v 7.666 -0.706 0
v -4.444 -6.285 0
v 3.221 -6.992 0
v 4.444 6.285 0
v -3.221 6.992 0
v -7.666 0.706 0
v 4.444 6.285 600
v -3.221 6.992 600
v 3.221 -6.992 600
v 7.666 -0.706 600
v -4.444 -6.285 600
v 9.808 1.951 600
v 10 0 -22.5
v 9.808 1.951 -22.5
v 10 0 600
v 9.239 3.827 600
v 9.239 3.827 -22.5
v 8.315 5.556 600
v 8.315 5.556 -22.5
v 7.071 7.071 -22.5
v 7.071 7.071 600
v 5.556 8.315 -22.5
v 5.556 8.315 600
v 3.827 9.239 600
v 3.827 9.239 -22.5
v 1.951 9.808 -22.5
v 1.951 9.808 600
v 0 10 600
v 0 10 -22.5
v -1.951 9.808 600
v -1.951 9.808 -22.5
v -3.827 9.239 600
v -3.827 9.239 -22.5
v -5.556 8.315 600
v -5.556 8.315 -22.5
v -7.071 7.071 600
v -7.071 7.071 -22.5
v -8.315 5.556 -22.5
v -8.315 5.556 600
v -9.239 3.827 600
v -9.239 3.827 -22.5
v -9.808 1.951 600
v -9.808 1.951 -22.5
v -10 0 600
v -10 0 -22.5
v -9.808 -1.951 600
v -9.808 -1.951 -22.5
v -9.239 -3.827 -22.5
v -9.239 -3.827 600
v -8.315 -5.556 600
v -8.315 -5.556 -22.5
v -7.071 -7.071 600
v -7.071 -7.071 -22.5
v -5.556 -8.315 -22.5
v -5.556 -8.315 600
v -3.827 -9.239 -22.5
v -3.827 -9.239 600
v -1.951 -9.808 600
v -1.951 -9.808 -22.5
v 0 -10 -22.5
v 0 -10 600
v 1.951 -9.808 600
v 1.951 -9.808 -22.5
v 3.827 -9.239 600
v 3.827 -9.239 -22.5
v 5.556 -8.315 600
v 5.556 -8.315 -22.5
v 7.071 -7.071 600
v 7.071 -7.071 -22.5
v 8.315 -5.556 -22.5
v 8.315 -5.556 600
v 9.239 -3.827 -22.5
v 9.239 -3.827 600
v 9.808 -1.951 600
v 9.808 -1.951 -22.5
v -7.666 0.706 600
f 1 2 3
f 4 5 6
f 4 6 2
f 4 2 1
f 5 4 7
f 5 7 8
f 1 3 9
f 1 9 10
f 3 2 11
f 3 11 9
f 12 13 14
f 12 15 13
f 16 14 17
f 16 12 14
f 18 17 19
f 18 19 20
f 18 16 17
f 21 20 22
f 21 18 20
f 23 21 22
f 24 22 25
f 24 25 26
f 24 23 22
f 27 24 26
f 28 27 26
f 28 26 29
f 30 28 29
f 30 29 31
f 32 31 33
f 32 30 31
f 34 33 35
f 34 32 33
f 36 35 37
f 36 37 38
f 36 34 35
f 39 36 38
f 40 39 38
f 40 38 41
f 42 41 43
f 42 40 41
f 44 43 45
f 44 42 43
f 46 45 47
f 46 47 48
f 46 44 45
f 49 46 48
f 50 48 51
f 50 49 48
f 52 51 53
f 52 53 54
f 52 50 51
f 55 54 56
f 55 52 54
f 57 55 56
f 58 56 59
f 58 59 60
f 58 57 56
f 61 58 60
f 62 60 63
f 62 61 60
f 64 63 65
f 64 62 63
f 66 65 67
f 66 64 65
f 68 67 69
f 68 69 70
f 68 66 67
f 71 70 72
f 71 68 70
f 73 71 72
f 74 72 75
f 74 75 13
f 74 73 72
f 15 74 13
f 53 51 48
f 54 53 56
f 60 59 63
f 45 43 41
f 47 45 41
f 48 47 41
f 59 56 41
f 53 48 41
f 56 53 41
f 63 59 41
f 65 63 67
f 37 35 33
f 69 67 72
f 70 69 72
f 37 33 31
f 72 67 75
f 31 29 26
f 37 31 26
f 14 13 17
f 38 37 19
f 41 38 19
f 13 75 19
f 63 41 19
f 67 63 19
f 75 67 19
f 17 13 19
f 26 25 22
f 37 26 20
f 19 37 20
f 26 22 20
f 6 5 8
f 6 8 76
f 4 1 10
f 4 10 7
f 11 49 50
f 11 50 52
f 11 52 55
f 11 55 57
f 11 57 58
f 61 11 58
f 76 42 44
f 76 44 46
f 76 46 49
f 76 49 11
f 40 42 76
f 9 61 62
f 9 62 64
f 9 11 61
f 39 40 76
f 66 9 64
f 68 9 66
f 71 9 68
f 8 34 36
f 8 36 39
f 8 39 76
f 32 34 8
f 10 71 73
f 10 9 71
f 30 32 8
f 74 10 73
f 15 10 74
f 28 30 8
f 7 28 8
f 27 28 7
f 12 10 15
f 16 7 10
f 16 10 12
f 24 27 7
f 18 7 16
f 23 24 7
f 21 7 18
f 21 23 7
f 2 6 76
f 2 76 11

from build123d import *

# Parameters (mm, degrees)
SKETCH1_R           = 10
BOSS_EXTRUDE1_DEPTH = 600
SKETCH2_R           = 10
BOSS_EXTRUDE2_DEPTH = 22.5


with BuildPart() as part:
    # Sketch1 → Boss-Extrude1 (new body)
    with BuildSketch(Plane.XY):
        Circle(SKETCH1_R)
        Polygon((7.665529004, -0.706345771), (4.444477884, 6.285369965), (-3.22105112, 6.991715737), (-7.665529004, 0.706345771), (-4.444477884, -6.285369965), (3.22105112, -6.991715737), align=None, mode=Mode.SUBTRACT)
    extrude(amount=BOSS_EXTRUDE1_DEPTH)

    # Sketch2 → Boss-Extrude2 (add)
    with BuildSketch(Plane.XY):
        Circle(SKETCH2_R)
    extrude(amount=-BOSS_EXTRUDE2_DEPTH)


solid = part.part
